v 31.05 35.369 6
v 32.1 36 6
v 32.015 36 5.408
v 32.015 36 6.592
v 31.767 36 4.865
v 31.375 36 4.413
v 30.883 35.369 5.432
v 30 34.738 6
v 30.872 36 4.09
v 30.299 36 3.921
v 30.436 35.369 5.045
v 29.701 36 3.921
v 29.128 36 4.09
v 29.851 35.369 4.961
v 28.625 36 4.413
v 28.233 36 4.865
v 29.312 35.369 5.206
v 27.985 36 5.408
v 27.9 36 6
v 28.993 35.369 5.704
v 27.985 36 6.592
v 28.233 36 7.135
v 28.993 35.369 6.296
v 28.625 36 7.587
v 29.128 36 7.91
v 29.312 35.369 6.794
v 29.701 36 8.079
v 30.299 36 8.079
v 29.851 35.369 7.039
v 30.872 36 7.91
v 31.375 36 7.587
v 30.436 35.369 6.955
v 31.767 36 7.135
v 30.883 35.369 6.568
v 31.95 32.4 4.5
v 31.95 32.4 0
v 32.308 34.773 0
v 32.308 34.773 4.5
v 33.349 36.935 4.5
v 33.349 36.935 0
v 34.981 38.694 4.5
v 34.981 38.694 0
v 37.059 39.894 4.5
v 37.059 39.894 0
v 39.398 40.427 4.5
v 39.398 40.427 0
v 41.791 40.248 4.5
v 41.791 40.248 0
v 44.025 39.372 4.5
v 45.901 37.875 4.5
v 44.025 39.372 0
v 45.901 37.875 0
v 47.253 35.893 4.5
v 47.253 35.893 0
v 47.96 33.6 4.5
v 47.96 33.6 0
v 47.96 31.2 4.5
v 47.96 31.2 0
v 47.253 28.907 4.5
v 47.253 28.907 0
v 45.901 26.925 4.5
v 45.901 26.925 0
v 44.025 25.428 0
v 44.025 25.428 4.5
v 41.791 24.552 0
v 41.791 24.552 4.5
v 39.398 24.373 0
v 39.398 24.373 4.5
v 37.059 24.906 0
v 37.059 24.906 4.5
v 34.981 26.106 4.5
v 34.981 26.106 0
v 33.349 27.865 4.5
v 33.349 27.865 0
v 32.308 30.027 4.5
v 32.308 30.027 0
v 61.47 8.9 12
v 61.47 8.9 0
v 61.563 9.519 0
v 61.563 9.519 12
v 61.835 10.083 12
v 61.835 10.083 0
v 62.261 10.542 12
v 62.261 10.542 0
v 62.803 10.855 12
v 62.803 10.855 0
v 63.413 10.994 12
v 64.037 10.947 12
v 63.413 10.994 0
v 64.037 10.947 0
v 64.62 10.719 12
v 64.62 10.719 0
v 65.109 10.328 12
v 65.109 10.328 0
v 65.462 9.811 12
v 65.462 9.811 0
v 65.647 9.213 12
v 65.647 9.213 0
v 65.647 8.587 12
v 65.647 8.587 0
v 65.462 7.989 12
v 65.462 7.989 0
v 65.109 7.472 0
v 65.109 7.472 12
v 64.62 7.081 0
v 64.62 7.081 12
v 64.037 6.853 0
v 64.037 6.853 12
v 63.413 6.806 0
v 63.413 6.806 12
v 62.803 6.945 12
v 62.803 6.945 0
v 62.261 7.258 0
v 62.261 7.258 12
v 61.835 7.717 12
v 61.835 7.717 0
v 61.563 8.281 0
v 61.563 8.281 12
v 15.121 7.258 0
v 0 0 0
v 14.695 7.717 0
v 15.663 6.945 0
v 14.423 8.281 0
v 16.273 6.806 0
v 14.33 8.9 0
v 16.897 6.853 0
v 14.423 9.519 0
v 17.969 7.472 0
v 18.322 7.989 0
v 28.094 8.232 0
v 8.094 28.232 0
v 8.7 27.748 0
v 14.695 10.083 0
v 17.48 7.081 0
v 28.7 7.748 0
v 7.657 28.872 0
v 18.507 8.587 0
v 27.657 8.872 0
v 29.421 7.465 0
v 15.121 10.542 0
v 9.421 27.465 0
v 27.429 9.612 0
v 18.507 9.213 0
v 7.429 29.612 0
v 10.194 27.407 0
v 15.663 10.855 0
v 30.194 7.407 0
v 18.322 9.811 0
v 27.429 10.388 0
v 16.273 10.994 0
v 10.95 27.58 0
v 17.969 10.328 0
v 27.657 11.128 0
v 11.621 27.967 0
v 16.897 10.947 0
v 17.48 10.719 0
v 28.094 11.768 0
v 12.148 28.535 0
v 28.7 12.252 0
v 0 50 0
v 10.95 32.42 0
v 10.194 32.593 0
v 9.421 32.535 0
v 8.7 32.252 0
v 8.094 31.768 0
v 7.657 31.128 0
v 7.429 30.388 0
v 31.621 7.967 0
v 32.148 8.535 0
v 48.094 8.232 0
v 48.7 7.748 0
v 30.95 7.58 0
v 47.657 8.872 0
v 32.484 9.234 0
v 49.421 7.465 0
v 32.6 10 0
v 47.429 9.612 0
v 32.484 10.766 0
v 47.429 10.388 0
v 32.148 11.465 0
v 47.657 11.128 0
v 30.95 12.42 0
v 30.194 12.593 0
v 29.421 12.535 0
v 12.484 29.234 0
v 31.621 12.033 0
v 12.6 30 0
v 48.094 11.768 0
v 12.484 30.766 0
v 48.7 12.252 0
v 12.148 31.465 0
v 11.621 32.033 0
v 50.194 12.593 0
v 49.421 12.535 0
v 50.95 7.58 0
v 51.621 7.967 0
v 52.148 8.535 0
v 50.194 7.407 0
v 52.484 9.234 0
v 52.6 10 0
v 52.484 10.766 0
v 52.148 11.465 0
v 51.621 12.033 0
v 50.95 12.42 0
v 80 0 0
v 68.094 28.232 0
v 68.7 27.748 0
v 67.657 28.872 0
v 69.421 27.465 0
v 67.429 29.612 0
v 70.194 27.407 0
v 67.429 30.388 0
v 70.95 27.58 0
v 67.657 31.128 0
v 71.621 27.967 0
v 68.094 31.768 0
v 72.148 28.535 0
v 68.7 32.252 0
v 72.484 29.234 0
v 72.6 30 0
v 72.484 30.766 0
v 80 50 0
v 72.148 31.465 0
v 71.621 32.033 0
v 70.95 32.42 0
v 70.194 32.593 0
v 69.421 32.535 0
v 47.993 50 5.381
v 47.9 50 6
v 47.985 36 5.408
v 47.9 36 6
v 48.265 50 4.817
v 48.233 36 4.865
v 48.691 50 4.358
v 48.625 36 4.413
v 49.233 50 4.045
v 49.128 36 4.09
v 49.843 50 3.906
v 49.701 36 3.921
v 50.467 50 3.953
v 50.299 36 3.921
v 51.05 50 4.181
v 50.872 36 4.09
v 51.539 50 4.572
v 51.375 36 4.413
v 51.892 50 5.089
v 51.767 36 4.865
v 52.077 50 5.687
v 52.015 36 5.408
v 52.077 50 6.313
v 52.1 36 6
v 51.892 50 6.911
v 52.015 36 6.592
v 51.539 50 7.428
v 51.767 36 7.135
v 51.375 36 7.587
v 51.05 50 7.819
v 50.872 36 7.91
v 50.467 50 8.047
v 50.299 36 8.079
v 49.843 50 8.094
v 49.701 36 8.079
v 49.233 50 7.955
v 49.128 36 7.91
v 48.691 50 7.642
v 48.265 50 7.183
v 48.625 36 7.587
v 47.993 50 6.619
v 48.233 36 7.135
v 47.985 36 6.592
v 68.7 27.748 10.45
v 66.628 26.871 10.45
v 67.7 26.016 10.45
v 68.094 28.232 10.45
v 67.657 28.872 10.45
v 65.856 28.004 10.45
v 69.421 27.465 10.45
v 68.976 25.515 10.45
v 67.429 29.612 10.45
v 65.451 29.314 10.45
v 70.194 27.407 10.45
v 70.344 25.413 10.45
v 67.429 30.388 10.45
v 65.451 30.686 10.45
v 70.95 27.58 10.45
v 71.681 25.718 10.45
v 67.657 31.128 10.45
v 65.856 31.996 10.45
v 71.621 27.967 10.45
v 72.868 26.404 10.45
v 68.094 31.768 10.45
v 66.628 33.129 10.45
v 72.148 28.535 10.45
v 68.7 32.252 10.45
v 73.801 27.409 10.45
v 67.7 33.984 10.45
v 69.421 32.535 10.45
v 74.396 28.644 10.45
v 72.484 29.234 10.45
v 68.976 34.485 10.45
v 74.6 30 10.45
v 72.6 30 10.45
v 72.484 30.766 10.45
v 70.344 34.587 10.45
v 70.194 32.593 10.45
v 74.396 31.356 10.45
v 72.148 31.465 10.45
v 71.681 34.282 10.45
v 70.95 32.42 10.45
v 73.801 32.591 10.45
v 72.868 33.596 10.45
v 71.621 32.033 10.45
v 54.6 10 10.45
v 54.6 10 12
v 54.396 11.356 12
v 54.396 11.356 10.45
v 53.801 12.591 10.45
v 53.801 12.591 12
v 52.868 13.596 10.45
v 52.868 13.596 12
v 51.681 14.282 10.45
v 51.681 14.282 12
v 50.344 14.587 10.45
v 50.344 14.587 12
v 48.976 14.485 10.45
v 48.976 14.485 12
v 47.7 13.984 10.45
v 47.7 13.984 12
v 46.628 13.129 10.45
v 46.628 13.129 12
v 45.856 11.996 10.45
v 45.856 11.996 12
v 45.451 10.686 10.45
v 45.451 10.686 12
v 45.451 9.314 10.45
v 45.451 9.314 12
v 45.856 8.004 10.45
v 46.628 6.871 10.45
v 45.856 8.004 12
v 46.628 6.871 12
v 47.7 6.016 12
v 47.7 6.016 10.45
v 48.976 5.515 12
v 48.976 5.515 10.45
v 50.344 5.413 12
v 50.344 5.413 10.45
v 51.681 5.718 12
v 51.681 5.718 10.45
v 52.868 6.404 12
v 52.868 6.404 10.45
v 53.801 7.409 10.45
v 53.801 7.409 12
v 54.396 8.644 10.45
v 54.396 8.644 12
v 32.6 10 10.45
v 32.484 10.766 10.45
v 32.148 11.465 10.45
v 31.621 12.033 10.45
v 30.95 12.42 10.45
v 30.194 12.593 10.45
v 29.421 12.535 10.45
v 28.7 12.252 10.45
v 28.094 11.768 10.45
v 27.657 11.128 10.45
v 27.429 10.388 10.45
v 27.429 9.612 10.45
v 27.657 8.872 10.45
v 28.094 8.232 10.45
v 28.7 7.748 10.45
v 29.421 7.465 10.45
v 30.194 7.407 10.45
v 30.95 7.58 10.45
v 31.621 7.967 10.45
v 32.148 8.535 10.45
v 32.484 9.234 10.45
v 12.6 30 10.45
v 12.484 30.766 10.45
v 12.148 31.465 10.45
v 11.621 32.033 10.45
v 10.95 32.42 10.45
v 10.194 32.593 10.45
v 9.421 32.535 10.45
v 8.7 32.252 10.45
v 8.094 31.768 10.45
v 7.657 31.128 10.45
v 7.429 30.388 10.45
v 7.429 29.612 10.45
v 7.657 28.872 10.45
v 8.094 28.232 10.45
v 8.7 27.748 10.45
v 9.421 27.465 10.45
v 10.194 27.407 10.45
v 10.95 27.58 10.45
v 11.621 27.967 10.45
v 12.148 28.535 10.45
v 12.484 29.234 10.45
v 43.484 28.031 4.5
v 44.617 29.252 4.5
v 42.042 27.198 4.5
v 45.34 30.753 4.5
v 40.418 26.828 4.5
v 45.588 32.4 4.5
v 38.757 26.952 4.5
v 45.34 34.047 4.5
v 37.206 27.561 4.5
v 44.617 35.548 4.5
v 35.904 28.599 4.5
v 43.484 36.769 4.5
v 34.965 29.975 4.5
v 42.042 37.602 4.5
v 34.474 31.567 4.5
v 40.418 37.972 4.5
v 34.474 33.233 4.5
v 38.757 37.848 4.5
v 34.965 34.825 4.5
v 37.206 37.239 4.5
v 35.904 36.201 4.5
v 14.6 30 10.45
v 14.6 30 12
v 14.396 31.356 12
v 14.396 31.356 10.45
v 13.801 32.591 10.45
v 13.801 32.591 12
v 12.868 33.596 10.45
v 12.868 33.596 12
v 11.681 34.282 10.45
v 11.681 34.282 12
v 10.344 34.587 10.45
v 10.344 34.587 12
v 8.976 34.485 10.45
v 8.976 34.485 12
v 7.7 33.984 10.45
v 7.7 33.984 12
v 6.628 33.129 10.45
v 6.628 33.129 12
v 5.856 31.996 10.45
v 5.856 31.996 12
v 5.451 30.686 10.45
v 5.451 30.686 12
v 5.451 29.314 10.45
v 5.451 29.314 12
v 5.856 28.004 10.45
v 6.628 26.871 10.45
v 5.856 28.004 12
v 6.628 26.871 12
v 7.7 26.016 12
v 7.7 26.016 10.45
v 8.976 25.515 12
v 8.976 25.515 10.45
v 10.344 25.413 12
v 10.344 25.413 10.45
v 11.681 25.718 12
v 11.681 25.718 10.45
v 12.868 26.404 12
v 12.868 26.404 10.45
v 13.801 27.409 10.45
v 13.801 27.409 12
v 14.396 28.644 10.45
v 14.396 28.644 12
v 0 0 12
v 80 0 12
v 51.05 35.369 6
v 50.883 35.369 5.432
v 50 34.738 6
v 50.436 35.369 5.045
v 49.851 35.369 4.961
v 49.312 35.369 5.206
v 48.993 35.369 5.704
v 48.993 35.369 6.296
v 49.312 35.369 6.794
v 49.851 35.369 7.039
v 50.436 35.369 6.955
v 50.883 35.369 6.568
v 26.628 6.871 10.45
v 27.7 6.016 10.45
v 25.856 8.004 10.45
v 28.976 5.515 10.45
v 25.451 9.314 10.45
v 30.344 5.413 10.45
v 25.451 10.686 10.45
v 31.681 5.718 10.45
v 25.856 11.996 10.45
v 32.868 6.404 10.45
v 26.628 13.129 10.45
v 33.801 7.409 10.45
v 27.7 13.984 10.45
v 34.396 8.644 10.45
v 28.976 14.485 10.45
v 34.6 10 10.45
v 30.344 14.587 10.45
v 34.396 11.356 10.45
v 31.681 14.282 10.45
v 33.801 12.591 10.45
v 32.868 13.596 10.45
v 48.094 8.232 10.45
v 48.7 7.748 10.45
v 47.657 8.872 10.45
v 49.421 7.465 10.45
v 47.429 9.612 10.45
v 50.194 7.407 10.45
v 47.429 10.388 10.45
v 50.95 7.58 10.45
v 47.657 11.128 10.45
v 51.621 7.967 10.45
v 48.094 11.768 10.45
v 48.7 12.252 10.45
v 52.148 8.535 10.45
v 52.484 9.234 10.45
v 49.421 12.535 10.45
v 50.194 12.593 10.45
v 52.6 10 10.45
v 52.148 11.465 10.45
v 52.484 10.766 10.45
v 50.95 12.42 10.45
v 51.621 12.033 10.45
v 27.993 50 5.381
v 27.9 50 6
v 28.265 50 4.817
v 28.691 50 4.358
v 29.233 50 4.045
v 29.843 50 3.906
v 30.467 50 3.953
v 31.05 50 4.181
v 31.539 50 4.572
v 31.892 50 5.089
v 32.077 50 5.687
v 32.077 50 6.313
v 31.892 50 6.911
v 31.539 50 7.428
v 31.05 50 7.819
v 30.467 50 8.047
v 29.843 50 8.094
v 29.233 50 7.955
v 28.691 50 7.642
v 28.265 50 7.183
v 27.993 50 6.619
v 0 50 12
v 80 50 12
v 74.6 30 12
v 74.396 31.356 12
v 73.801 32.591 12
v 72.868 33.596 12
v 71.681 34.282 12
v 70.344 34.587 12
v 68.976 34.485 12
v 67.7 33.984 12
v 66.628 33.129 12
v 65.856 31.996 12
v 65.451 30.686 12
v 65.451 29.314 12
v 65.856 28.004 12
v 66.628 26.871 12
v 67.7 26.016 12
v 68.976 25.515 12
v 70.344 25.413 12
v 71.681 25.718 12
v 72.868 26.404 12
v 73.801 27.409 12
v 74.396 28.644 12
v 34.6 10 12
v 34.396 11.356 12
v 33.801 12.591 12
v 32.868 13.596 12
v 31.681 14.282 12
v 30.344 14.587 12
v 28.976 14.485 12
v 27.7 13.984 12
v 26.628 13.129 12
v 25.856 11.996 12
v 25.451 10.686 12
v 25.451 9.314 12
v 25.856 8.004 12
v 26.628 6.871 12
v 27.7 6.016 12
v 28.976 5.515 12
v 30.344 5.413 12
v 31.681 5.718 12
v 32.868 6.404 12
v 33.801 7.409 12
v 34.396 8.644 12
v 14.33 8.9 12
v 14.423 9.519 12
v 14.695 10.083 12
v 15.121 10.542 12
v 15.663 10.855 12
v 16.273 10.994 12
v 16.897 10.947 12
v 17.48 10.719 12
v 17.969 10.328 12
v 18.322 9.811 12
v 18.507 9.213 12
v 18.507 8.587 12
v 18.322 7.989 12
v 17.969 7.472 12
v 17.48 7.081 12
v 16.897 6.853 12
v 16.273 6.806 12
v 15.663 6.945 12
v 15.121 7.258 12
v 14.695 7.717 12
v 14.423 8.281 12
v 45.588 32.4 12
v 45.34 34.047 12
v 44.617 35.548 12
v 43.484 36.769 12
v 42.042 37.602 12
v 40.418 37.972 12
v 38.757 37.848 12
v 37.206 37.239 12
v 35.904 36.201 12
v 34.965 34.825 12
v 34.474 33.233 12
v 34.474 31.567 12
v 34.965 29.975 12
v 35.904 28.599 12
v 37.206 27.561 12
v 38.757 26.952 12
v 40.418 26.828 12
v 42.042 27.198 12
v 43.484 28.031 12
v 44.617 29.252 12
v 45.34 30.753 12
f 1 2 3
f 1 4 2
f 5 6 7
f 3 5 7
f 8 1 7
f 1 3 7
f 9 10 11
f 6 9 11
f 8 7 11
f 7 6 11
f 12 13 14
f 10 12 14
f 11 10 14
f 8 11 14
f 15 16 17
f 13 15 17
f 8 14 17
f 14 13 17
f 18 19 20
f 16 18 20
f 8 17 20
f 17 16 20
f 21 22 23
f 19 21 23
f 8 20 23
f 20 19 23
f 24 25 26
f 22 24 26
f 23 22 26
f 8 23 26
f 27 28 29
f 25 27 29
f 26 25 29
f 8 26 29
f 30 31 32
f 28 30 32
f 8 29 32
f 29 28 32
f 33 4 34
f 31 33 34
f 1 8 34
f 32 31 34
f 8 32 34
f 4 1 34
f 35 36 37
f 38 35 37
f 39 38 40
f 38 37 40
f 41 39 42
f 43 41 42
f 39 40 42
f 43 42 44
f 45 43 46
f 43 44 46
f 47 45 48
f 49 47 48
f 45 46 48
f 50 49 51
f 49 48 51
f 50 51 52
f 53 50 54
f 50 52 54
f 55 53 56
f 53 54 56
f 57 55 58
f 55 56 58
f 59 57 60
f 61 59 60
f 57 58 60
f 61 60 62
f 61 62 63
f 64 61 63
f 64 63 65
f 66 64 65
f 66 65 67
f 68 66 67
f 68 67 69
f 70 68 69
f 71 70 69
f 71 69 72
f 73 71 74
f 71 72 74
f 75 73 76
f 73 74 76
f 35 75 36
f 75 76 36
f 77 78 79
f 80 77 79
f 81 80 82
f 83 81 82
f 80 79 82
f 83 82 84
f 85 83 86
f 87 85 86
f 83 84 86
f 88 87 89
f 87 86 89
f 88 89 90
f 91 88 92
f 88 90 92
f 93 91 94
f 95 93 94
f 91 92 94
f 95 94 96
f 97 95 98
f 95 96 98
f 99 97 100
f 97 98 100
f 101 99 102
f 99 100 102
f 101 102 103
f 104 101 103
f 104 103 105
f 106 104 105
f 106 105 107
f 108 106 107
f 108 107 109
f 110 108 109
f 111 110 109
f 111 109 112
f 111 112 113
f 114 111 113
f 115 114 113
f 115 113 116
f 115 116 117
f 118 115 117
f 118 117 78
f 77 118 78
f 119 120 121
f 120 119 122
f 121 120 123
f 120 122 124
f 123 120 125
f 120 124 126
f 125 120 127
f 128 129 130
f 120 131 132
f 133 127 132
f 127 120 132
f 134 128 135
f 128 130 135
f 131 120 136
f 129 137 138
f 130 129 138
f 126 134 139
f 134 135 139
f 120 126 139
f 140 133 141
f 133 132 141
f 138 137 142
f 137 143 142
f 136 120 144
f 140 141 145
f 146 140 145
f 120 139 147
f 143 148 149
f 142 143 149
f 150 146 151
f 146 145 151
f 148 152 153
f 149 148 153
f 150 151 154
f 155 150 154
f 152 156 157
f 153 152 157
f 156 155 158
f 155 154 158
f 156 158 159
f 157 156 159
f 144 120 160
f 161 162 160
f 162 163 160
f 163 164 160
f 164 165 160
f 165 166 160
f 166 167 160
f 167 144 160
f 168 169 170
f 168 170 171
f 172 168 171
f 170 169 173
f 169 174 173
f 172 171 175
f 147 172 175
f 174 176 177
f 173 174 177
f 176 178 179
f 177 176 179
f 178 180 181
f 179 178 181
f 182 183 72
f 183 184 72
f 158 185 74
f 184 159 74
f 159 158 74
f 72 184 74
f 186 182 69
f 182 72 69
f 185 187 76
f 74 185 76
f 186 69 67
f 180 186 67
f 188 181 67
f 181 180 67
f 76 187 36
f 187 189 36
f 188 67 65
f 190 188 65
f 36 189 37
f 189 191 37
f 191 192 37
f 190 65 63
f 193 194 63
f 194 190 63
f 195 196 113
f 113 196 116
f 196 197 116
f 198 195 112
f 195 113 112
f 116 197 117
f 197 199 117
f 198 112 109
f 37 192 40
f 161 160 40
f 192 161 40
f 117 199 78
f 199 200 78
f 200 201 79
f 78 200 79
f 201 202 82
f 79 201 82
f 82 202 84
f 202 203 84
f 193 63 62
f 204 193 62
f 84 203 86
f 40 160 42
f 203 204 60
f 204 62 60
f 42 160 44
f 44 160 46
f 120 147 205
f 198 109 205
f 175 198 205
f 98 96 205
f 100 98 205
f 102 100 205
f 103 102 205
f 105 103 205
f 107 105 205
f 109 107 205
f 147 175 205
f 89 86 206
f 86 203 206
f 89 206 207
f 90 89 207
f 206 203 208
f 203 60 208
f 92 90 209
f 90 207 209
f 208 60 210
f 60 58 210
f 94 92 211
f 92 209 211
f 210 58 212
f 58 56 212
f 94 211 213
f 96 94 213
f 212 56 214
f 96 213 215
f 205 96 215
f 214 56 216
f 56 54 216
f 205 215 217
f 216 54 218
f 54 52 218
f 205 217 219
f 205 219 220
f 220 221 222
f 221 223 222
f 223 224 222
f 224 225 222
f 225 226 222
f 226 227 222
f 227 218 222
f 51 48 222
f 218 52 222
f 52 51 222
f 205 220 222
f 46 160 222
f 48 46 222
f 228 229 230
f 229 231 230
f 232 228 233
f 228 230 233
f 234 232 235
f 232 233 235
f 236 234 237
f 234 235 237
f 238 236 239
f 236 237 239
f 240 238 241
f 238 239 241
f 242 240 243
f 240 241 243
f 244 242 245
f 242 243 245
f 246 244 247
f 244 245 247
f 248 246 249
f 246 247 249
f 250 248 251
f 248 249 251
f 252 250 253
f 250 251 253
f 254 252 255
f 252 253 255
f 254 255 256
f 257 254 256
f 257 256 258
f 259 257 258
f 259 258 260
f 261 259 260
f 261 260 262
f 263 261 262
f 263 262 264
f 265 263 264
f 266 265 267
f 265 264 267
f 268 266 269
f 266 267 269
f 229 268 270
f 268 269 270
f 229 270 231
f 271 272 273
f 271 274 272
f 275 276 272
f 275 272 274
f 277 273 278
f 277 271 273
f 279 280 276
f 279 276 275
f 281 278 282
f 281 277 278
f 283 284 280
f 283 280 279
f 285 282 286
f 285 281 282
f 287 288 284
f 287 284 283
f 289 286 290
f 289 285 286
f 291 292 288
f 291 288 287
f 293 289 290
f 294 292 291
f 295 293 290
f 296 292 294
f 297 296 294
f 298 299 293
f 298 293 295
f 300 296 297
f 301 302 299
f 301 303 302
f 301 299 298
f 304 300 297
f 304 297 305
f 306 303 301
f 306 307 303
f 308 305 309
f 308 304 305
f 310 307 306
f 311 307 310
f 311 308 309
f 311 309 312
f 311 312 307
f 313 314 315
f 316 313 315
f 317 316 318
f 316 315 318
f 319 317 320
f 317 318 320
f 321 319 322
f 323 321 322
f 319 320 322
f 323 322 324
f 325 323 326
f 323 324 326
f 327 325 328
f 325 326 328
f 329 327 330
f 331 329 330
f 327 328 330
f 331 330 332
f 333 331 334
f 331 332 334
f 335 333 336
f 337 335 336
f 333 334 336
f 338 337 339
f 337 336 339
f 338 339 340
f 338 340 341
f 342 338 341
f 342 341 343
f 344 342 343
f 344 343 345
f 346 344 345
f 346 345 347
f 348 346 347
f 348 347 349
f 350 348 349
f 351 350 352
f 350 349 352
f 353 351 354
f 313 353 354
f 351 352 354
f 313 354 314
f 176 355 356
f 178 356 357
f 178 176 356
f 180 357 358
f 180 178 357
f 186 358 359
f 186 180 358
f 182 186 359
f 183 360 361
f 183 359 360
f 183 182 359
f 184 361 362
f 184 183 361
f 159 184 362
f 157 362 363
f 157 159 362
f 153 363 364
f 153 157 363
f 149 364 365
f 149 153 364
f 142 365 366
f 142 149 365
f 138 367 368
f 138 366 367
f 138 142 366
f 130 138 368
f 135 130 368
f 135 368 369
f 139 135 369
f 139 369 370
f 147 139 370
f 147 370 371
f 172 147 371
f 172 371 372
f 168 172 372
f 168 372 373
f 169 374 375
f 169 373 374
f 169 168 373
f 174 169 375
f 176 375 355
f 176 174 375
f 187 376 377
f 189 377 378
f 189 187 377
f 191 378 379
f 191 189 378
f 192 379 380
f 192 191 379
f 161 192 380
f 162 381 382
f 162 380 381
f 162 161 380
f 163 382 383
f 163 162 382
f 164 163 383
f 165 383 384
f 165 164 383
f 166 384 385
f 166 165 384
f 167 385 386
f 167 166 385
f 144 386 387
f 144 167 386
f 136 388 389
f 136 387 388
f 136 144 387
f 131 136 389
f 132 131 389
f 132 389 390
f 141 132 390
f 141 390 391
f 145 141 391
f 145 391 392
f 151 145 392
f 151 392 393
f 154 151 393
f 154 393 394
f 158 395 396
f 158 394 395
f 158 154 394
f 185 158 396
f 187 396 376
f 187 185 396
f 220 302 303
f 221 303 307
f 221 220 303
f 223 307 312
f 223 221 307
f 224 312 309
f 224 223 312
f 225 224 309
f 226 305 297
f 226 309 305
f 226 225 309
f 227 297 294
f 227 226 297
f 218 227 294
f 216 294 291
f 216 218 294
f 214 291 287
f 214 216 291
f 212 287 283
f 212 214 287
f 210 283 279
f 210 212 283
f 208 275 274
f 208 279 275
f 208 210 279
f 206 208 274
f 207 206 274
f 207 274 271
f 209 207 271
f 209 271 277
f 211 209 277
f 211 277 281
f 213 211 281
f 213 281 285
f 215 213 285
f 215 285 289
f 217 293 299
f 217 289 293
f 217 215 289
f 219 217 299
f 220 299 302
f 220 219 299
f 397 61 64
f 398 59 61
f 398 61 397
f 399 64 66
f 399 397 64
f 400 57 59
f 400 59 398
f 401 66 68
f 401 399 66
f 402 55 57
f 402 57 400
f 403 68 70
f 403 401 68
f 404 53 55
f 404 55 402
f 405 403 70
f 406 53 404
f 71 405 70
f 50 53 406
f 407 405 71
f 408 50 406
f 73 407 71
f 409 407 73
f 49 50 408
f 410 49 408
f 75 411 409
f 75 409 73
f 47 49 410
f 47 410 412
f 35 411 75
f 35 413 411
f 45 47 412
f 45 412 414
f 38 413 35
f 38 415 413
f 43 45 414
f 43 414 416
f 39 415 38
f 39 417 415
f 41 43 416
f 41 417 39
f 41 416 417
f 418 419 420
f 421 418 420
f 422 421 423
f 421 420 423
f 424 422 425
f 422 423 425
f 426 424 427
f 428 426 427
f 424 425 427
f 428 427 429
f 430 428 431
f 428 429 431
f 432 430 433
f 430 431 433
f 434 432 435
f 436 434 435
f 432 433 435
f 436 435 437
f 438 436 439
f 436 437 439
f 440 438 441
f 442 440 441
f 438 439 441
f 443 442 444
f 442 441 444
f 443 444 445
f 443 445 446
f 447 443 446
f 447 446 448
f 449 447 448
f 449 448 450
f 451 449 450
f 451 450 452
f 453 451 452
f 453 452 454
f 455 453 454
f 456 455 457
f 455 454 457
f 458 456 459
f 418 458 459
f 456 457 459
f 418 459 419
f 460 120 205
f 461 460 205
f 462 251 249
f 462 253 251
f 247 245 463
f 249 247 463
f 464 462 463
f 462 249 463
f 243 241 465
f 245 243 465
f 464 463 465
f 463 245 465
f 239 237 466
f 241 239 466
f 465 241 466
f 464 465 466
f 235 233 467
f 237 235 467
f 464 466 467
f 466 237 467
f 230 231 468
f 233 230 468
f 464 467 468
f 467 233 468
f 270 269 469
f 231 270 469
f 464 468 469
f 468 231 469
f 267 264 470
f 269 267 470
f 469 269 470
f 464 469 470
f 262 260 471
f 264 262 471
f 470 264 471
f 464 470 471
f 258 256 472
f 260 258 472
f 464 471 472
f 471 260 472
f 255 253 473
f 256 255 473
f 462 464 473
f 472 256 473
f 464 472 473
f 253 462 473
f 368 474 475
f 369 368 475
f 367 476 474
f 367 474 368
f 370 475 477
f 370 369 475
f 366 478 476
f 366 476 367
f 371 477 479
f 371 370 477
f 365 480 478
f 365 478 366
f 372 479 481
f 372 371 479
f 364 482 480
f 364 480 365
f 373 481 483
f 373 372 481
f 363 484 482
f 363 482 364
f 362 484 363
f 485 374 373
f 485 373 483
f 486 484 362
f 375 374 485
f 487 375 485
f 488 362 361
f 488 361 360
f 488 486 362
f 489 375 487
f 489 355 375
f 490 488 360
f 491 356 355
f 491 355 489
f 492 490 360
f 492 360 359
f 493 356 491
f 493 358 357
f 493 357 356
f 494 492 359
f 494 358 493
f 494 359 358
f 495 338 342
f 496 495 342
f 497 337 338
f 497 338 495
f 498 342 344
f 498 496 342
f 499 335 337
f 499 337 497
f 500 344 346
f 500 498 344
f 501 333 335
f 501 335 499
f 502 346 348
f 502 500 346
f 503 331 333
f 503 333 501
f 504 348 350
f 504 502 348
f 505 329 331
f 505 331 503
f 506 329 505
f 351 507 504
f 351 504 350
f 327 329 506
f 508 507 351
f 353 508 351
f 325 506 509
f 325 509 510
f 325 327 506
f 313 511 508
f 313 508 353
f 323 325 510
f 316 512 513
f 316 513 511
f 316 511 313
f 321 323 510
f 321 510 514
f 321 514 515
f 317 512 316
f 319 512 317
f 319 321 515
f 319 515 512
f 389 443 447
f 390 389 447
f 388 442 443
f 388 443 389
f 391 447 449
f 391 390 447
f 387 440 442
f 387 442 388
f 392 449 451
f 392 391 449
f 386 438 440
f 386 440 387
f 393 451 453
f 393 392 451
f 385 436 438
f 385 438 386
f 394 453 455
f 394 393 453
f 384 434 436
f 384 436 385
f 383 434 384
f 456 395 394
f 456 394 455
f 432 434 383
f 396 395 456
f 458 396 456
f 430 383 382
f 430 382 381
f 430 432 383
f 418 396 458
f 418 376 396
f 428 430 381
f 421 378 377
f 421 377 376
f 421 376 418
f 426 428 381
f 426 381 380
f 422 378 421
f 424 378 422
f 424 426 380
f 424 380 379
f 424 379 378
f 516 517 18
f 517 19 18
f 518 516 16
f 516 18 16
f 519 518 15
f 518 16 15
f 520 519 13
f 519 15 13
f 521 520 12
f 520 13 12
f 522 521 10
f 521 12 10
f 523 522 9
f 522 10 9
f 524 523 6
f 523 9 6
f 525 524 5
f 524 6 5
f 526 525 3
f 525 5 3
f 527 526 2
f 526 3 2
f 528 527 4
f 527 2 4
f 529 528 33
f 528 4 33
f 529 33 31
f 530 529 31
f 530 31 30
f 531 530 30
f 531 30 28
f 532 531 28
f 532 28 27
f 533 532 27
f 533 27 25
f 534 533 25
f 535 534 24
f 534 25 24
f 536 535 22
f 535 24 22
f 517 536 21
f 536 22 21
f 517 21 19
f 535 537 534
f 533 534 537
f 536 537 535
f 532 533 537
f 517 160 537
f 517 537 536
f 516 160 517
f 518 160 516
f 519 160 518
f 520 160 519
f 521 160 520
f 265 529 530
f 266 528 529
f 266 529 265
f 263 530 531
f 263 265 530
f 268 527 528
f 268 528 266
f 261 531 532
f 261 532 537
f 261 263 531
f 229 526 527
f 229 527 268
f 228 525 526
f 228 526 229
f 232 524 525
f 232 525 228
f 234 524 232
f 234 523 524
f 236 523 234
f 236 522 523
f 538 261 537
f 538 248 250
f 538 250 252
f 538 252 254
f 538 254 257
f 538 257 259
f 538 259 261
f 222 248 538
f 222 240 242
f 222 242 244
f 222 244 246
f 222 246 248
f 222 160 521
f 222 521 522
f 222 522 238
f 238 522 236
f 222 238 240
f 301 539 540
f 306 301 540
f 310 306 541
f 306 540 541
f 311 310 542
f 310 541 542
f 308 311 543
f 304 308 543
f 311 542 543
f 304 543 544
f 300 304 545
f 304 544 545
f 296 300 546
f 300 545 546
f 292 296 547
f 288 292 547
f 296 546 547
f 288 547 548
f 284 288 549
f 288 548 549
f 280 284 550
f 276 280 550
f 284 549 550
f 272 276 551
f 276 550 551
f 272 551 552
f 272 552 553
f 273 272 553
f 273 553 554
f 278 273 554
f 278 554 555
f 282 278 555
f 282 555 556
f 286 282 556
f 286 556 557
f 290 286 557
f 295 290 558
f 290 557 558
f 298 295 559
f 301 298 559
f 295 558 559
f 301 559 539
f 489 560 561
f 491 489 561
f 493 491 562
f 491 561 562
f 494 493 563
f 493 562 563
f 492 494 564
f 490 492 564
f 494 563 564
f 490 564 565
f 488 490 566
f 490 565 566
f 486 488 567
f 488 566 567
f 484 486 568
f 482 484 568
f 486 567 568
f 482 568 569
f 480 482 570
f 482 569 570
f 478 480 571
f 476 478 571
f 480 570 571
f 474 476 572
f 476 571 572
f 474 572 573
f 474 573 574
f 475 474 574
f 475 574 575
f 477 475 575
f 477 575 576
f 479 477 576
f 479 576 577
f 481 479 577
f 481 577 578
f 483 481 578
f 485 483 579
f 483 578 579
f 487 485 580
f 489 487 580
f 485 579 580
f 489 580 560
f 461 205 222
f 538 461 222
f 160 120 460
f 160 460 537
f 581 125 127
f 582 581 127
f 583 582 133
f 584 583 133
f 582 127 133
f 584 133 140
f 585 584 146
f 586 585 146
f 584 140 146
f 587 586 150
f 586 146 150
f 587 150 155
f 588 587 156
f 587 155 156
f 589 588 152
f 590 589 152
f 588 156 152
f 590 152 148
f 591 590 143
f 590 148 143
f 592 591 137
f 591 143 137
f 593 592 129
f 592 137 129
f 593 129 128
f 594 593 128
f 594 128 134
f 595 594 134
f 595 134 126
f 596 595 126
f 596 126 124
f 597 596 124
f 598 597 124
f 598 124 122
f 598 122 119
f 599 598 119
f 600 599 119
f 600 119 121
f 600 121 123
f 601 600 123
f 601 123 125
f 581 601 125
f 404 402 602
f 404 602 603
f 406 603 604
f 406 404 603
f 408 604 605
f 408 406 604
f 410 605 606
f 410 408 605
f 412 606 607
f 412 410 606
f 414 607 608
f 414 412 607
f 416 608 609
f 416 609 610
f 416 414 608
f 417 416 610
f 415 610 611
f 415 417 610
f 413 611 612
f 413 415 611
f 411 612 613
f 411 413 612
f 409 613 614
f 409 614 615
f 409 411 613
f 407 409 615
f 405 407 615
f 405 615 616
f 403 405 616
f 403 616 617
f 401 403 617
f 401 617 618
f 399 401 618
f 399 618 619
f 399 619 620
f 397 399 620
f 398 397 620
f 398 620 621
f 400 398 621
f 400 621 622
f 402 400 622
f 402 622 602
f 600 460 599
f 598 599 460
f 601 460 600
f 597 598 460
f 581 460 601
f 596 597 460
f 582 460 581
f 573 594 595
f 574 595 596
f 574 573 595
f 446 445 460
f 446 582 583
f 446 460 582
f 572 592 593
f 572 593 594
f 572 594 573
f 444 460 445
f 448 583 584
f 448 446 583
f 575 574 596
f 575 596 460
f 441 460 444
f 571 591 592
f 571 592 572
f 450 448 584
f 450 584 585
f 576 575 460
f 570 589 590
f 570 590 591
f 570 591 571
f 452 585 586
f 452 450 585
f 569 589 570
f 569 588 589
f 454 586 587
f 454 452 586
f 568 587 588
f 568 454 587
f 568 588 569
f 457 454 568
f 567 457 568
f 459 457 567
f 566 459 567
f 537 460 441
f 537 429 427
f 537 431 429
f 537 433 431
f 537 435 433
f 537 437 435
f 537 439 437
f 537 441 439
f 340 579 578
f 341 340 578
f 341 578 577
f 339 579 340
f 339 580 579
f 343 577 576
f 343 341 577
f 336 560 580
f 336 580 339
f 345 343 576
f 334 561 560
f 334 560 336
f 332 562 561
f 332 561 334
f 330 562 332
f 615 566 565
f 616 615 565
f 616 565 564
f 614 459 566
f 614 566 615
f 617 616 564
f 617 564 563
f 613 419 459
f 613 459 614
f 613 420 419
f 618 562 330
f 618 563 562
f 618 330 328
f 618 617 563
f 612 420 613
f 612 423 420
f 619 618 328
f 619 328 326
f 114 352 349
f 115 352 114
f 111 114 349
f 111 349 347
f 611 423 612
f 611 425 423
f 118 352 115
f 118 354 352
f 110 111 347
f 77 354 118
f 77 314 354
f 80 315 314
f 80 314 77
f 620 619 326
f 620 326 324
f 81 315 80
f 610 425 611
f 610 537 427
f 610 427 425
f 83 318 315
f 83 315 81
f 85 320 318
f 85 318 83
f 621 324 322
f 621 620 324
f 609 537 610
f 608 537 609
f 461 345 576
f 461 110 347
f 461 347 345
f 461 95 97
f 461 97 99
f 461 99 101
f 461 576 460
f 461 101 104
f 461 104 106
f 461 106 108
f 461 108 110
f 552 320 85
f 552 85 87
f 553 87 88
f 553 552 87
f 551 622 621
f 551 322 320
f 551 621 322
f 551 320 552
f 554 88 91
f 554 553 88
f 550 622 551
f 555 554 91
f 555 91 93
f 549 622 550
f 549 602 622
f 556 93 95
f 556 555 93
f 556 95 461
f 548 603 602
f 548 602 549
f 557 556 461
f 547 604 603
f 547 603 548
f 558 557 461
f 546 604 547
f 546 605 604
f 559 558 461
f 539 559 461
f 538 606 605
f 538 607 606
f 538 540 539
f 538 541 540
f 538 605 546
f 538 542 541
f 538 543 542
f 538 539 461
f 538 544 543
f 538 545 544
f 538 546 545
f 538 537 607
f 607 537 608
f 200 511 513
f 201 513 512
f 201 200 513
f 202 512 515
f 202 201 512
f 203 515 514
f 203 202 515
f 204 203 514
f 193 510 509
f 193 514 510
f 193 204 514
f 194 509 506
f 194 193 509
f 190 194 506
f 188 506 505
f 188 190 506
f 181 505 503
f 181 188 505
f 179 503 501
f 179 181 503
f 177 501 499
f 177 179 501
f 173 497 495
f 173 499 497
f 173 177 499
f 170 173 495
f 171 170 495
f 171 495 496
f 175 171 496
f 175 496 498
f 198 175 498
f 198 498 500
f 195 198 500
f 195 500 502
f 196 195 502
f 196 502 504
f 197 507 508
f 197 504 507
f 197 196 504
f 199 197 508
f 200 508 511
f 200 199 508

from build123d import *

# Parameters (mm, degrees)
SKETCH1_W                 = 80
SKETCH1_H                 = 50
SKETCH1_R                 = 5.588
SKETCH1_R_2               = 2.6
BOSS_EXTRUDE1_DEPTH       = 12
SKETCH2_R                 = 4.6
CUT_EXTRUDE1_DEPTH        = 1.55
M5X0_8_TAPPED_HOLE1_D     = 4.2
M5X0_8_TAPPED_HOLE2_D     = 4.2
M5X0_8_TAPPED_HOLE2_DEPTH = 14
M5X0_8_TAPPED_HOLE2_TIP   = 1.2618073
SKETCH7_R                 = 8.05
CUT_EXTRUDE2_DEPTH        = 4.5


with BuildPart() as part:
    # Sketch1 → Boss-Extrude1 (new body)
    with BuildSketch(Plane.XY):
        with Locations((40, 25)):
            Rectangle(SKETCH1_W, SKETCH1_H)
        with Locations((40, 32.4)):
            Circle(SKETCH1_R, mode=Mode.SUBTRACT)
        with Locations((30, 10)):
            Circle(SKETCH1_R_2, mode=Mode.SUBTRACT)
        with Locations((10, 30)):
            Circle(SKETCH1_R_2, mode=Mode.SUBTRACT)
        with Locations((50, 10)):
            Circle(SKETCH1_R_2, mode=Mode.SUBTRACT)
        with Locations((70, 30)):
            Circle(SKETCH1_R_2, mode=Mode.SUBTRACT)
    extrude(amount=BOSS_EXTRUDE1_DEPTH)

    # Sketch2 → Cut-Extrude1 (cut)
    with BuildSketch(Plane.XY.offset(12)):
        with Locations((10, 30)):
            Circle(SKETCH2_R)
        with Locations((30, 10)):
            Circle(SKETCH2_R)
        with Locations((50, 10)):
            Circle(SKETCH2_R)
        with Locations((70, 30)):
            Circle(SKETCH2_R)
    extrude(amount=-CUT_EXTRUDE1_DEPTH, mode=Mode.SUBTRACT)

    # M5x0.8 Tapped Hole1 (through all)
    with Locations(Plane.XY.offset(12)):
        with Locations((16.43, 8.9), (63.57, 8.9)):
            Hole(M5X0_8_TAPPED_HOLE1_D / 2)

    # M5x0.8 Tapped Hole2
    with Locations(Plane(origin=(0, 50, 0), x_dir=(1, 0, 0), z_dir=(0, 1, 0))):
        with Locations((30, -6), (50, -6)):
            Hole(M5X0_8_TAPPED_HOLE2_D / 2, depth=M5X0_8_TAPPED_HOLE2_DEPTH)
            with Locations((0, 0, -(M5X0_8_TAPPED_HOLE2_DEPTH + M5X0_8_TAPPED_HOLE2_TIP / 2))):  # 118° drill point
                Cone(0, M5X0_8_TAPPED_HOLE2_D / 2, M5X0_8_TAPPED_HOLE2_TIP, mode=Mode.SUBTRACT)

    # Sketch7 → Cut-Extrude2 (cut)
    with BuildSketch(Plane(origin=(0, 0, 0), x_dir=(-1, 0, 0), z_dir=(0, 0, -1))):
        with Locations((-40, 32.4)):
            Circle(SKETCH7_R)
    extrude(amount=-CUT_EXTRUDE2_DEPTH, mode=Mode.SUBTRACT)


solid = part.part
